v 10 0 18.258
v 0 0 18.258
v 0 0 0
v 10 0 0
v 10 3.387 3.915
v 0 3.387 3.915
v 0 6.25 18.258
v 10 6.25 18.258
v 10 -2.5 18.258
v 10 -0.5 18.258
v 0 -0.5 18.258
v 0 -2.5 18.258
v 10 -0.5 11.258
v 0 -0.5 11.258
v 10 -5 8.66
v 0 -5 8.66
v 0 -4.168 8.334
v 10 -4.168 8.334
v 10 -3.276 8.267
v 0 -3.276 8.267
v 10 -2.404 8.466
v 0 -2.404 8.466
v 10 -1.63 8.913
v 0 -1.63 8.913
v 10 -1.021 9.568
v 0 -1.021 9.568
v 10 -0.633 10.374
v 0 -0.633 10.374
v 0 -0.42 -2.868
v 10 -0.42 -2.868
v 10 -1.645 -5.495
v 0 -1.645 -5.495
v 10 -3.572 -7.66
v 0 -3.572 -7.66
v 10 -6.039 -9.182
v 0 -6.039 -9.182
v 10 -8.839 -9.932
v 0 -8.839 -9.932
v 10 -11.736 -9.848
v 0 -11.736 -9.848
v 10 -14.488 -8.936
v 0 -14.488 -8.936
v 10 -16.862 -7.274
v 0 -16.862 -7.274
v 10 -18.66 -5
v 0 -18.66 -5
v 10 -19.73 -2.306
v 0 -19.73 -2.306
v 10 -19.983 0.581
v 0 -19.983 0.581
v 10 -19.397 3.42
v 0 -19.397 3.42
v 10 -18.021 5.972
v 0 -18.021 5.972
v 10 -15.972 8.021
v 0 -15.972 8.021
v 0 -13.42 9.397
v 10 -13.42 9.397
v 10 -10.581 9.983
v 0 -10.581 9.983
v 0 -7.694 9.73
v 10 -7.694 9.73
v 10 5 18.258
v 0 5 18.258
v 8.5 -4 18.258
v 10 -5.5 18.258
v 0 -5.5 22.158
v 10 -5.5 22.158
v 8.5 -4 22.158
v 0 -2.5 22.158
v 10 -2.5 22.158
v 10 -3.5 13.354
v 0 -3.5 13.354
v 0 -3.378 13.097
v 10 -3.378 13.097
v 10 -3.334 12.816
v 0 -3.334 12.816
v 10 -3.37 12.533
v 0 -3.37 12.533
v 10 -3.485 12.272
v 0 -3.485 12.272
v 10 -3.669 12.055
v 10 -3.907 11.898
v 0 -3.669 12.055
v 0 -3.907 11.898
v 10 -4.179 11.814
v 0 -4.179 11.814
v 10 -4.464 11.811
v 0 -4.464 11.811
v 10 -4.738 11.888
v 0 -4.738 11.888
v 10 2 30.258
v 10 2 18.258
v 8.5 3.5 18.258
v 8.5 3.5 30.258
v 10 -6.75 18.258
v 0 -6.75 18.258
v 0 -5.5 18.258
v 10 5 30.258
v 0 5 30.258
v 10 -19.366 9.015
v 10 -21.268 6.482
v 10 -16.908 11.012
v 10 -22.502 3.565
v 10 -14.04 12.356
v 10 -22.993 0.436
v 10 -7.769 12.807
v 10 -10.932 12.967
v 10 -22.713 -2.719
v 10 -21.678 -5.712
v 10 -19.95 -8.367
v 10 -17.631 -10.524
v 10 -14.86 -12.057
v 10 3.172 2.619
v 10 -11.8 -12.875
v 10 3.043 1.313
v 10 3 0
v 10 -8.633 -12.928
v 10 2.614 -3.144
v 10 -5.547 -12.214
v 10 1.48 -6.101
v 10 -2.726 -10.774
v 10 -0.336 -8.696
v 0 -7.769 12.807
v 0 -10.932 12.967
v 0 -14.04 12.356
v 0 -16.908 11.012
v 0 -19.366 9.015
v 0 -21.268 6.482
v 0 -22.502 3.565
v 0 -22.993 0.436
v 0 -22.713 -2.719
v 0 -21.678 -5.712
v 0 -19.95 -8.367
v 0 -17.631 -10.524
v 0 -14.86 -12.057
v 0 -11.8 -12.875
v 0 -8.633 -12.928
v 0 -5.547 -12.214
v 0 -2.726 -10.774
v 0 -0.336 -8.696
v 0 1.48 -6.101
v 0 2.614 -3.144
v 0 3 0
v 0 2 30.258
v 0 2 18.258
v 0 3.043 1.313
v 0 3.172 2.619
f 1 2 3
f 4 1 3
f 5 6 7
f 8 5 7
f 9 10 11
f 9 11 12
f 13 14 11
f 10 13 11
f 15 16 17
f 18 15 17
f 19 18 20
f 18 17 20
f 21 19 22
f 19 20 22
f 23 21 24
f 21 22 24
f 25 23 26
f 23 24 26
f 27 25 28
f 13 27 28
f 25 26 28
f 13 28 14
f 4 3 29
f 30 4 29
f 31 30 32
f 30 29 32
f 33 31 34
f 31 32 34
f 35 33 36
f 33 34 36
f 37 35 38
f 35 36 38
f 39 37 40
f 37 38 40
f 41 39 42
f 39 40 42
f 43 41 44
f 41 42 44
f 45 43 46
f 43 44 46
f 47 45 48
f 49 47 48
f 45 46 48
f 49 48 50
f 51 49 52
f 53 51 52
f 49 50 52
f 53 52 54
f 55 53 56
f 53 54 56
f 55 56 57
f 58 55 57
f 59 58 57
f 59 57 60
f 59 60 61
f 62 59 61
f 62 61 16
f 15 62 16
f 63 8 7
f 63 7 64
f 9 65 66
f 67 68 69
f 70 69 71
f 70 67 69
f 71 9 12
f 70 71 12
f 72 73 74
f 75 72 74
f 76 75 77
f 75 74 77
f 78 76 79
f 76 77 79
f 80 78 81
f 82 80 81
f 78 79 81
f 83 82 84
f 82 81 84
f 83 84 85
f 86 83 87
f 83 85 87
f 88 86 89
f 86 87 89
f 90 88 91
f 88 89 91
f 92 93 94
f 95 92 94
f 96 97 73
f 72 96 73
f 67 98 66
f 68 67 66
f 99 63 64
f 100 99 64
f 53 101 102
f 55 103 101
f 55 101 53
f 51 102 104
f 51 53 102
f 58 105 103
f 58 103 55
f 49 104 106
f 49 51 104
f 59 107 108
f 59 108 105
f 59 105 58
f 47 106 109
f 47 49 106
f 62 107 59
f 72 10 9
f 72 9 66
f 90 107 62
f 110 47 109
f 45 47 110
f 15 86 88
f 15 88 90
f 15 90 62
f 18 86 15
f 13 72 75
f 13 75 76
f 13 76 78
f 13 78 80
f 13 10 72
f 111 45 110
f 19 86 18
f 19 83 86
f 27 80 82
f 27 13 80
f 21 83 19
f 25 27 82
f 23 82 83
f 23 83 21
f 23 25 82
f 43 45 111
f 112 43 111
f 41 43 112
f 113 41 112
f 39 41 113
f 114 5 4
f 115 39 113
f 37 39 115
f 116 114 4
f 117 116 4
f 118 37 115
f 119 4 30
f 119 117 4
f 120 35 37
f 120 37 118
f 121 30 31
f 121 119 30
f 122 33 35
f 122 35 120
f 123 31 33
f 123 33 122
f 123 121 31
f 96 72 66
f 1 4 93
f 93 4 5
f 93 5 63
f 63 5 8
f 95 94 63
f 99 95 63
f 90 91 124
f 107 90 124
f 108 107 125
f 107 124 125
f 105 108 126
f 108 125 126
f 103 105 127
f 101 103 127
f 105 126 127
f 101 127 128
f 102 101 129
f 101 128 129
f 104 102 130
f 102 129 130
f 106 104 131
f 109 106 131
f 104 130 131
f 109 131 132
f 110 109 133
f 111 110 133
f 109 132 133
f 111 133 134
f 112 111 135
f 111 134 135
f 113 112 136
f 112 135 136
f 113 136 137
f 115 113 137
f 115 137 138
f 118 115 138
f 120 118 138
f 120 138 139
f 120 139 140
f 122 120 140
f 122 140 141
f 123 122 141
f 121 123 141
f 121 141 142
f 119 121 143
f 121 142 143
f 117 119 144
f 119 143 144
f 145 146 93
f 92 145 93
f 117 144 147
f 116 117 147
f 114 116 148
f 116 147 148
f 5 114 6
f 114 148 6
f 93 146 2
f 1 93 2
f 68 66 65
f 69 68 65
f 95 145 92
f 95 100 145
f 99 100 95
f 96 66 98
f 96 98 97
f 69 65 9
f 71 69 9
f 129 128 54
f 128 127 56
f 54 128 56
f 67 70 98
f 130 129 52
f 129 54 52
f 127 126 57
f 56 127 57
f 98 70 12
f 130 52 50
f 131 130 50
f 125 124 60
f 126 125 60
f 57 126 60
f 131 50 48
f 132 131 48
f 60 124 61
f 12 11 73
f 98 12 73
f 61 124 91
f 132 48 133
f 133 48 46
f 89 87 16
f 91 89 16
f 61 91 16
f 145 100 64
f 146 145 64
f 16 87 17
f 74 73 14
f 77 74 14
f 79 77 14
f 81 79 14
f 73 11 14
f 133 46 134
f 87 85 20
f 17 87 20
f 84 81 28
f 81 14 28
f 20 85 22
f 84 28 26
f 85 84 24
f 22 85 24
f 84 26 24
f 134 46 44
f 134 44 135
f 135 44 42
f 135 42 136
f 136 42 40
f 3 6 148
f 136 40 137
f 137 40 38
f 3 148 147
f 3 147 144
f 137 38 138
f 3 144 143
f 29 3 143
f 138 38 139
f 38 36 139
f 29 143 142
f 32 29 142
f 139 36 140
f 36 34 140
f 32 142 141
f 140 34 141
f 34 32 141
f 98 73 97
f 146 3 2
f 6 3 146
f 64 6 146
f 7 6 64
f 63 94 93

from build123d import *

# Parameters (mm, degrees)
BOSS_EXTRUDE1_DEPTH = 10
BOSS_EXTRUDE4_DEPTH = 12
SKETCH6_W           = 8.1
SKETCH6_H           = 3
CUT_EXTRUDE2_DEPTH  = 12


with BuildPart() as part:
    # Sketch1 → Boss-Extrude1 (new body)
    with BuildSketch(Plane(origin=(0, 0, 0), x_dir=(0, 0, -1), z_dir=(1, 0, 0))):
        with BuildLine():
            Line((-11.258330249, -0.5), (-18.258330249, -0.5))
            Line((-18.258330249, -0.5), (-18.258330249, -6.75))
            Line((-18.258330249, -6.75), (-13.354440804, -3.5))
            ThreePointArc((-13.354440804, -3.5), (-12.156943399, -3.569431047), (-11.887579875, -4.738304007))
            ThreePointArc((-11.887579875, -4.738304007), (7.092177102, -20.894999952), (0, 3))
            ThreePointArc((0, 3), (-1.967023285, 3.096964568), (-3.914973414, 3.38691806))
            Line((-3.914973414, 3.38691806), (-18.258330249, 6.25))
            Line((-18.258330249, 6.25), (-18.258330249, 0))
            Line((-18.258330249, 0), (0, 0))
            ThreePointArc((0, 0), (5, -18.660254038), (-8.660254038, -5))
            ThreePointArc((-8.660254038, -5), (-8.660254038, -2), (-11.258330249, -0.5))
        make_face()
    extrude(amount=BOSS_EXTRUDE1_DEPTH)

    # Sketch2 → Boss-Extrude4 (add)
    with BuildSketch(Plane.XY.offset(18.258330249)):
        Polygon((0, 2), (10, 2), (8.5, 3.5), (10, 5), (0, 5), align=None)
        Polygon((0, -5.5), (10, -5.5), (8.5, -4), (10, -2.5), (0, -2.5), align=None)
    extrude(amount=BOSS_EXTRUDE4_DEPTH)

    # Sketch6 → Cut-Extrude2 (cut)
    with BuildSketch(Plane.ZY):
        with Locations((26.208330249, -4)):
            Rectangle(SKETCH6_W, SKETCH6_H)
    extrude(amount=-CUT_EXTRUDE2_DEPTH, mode=Mode.SUBTRACT)


solid = part.part
